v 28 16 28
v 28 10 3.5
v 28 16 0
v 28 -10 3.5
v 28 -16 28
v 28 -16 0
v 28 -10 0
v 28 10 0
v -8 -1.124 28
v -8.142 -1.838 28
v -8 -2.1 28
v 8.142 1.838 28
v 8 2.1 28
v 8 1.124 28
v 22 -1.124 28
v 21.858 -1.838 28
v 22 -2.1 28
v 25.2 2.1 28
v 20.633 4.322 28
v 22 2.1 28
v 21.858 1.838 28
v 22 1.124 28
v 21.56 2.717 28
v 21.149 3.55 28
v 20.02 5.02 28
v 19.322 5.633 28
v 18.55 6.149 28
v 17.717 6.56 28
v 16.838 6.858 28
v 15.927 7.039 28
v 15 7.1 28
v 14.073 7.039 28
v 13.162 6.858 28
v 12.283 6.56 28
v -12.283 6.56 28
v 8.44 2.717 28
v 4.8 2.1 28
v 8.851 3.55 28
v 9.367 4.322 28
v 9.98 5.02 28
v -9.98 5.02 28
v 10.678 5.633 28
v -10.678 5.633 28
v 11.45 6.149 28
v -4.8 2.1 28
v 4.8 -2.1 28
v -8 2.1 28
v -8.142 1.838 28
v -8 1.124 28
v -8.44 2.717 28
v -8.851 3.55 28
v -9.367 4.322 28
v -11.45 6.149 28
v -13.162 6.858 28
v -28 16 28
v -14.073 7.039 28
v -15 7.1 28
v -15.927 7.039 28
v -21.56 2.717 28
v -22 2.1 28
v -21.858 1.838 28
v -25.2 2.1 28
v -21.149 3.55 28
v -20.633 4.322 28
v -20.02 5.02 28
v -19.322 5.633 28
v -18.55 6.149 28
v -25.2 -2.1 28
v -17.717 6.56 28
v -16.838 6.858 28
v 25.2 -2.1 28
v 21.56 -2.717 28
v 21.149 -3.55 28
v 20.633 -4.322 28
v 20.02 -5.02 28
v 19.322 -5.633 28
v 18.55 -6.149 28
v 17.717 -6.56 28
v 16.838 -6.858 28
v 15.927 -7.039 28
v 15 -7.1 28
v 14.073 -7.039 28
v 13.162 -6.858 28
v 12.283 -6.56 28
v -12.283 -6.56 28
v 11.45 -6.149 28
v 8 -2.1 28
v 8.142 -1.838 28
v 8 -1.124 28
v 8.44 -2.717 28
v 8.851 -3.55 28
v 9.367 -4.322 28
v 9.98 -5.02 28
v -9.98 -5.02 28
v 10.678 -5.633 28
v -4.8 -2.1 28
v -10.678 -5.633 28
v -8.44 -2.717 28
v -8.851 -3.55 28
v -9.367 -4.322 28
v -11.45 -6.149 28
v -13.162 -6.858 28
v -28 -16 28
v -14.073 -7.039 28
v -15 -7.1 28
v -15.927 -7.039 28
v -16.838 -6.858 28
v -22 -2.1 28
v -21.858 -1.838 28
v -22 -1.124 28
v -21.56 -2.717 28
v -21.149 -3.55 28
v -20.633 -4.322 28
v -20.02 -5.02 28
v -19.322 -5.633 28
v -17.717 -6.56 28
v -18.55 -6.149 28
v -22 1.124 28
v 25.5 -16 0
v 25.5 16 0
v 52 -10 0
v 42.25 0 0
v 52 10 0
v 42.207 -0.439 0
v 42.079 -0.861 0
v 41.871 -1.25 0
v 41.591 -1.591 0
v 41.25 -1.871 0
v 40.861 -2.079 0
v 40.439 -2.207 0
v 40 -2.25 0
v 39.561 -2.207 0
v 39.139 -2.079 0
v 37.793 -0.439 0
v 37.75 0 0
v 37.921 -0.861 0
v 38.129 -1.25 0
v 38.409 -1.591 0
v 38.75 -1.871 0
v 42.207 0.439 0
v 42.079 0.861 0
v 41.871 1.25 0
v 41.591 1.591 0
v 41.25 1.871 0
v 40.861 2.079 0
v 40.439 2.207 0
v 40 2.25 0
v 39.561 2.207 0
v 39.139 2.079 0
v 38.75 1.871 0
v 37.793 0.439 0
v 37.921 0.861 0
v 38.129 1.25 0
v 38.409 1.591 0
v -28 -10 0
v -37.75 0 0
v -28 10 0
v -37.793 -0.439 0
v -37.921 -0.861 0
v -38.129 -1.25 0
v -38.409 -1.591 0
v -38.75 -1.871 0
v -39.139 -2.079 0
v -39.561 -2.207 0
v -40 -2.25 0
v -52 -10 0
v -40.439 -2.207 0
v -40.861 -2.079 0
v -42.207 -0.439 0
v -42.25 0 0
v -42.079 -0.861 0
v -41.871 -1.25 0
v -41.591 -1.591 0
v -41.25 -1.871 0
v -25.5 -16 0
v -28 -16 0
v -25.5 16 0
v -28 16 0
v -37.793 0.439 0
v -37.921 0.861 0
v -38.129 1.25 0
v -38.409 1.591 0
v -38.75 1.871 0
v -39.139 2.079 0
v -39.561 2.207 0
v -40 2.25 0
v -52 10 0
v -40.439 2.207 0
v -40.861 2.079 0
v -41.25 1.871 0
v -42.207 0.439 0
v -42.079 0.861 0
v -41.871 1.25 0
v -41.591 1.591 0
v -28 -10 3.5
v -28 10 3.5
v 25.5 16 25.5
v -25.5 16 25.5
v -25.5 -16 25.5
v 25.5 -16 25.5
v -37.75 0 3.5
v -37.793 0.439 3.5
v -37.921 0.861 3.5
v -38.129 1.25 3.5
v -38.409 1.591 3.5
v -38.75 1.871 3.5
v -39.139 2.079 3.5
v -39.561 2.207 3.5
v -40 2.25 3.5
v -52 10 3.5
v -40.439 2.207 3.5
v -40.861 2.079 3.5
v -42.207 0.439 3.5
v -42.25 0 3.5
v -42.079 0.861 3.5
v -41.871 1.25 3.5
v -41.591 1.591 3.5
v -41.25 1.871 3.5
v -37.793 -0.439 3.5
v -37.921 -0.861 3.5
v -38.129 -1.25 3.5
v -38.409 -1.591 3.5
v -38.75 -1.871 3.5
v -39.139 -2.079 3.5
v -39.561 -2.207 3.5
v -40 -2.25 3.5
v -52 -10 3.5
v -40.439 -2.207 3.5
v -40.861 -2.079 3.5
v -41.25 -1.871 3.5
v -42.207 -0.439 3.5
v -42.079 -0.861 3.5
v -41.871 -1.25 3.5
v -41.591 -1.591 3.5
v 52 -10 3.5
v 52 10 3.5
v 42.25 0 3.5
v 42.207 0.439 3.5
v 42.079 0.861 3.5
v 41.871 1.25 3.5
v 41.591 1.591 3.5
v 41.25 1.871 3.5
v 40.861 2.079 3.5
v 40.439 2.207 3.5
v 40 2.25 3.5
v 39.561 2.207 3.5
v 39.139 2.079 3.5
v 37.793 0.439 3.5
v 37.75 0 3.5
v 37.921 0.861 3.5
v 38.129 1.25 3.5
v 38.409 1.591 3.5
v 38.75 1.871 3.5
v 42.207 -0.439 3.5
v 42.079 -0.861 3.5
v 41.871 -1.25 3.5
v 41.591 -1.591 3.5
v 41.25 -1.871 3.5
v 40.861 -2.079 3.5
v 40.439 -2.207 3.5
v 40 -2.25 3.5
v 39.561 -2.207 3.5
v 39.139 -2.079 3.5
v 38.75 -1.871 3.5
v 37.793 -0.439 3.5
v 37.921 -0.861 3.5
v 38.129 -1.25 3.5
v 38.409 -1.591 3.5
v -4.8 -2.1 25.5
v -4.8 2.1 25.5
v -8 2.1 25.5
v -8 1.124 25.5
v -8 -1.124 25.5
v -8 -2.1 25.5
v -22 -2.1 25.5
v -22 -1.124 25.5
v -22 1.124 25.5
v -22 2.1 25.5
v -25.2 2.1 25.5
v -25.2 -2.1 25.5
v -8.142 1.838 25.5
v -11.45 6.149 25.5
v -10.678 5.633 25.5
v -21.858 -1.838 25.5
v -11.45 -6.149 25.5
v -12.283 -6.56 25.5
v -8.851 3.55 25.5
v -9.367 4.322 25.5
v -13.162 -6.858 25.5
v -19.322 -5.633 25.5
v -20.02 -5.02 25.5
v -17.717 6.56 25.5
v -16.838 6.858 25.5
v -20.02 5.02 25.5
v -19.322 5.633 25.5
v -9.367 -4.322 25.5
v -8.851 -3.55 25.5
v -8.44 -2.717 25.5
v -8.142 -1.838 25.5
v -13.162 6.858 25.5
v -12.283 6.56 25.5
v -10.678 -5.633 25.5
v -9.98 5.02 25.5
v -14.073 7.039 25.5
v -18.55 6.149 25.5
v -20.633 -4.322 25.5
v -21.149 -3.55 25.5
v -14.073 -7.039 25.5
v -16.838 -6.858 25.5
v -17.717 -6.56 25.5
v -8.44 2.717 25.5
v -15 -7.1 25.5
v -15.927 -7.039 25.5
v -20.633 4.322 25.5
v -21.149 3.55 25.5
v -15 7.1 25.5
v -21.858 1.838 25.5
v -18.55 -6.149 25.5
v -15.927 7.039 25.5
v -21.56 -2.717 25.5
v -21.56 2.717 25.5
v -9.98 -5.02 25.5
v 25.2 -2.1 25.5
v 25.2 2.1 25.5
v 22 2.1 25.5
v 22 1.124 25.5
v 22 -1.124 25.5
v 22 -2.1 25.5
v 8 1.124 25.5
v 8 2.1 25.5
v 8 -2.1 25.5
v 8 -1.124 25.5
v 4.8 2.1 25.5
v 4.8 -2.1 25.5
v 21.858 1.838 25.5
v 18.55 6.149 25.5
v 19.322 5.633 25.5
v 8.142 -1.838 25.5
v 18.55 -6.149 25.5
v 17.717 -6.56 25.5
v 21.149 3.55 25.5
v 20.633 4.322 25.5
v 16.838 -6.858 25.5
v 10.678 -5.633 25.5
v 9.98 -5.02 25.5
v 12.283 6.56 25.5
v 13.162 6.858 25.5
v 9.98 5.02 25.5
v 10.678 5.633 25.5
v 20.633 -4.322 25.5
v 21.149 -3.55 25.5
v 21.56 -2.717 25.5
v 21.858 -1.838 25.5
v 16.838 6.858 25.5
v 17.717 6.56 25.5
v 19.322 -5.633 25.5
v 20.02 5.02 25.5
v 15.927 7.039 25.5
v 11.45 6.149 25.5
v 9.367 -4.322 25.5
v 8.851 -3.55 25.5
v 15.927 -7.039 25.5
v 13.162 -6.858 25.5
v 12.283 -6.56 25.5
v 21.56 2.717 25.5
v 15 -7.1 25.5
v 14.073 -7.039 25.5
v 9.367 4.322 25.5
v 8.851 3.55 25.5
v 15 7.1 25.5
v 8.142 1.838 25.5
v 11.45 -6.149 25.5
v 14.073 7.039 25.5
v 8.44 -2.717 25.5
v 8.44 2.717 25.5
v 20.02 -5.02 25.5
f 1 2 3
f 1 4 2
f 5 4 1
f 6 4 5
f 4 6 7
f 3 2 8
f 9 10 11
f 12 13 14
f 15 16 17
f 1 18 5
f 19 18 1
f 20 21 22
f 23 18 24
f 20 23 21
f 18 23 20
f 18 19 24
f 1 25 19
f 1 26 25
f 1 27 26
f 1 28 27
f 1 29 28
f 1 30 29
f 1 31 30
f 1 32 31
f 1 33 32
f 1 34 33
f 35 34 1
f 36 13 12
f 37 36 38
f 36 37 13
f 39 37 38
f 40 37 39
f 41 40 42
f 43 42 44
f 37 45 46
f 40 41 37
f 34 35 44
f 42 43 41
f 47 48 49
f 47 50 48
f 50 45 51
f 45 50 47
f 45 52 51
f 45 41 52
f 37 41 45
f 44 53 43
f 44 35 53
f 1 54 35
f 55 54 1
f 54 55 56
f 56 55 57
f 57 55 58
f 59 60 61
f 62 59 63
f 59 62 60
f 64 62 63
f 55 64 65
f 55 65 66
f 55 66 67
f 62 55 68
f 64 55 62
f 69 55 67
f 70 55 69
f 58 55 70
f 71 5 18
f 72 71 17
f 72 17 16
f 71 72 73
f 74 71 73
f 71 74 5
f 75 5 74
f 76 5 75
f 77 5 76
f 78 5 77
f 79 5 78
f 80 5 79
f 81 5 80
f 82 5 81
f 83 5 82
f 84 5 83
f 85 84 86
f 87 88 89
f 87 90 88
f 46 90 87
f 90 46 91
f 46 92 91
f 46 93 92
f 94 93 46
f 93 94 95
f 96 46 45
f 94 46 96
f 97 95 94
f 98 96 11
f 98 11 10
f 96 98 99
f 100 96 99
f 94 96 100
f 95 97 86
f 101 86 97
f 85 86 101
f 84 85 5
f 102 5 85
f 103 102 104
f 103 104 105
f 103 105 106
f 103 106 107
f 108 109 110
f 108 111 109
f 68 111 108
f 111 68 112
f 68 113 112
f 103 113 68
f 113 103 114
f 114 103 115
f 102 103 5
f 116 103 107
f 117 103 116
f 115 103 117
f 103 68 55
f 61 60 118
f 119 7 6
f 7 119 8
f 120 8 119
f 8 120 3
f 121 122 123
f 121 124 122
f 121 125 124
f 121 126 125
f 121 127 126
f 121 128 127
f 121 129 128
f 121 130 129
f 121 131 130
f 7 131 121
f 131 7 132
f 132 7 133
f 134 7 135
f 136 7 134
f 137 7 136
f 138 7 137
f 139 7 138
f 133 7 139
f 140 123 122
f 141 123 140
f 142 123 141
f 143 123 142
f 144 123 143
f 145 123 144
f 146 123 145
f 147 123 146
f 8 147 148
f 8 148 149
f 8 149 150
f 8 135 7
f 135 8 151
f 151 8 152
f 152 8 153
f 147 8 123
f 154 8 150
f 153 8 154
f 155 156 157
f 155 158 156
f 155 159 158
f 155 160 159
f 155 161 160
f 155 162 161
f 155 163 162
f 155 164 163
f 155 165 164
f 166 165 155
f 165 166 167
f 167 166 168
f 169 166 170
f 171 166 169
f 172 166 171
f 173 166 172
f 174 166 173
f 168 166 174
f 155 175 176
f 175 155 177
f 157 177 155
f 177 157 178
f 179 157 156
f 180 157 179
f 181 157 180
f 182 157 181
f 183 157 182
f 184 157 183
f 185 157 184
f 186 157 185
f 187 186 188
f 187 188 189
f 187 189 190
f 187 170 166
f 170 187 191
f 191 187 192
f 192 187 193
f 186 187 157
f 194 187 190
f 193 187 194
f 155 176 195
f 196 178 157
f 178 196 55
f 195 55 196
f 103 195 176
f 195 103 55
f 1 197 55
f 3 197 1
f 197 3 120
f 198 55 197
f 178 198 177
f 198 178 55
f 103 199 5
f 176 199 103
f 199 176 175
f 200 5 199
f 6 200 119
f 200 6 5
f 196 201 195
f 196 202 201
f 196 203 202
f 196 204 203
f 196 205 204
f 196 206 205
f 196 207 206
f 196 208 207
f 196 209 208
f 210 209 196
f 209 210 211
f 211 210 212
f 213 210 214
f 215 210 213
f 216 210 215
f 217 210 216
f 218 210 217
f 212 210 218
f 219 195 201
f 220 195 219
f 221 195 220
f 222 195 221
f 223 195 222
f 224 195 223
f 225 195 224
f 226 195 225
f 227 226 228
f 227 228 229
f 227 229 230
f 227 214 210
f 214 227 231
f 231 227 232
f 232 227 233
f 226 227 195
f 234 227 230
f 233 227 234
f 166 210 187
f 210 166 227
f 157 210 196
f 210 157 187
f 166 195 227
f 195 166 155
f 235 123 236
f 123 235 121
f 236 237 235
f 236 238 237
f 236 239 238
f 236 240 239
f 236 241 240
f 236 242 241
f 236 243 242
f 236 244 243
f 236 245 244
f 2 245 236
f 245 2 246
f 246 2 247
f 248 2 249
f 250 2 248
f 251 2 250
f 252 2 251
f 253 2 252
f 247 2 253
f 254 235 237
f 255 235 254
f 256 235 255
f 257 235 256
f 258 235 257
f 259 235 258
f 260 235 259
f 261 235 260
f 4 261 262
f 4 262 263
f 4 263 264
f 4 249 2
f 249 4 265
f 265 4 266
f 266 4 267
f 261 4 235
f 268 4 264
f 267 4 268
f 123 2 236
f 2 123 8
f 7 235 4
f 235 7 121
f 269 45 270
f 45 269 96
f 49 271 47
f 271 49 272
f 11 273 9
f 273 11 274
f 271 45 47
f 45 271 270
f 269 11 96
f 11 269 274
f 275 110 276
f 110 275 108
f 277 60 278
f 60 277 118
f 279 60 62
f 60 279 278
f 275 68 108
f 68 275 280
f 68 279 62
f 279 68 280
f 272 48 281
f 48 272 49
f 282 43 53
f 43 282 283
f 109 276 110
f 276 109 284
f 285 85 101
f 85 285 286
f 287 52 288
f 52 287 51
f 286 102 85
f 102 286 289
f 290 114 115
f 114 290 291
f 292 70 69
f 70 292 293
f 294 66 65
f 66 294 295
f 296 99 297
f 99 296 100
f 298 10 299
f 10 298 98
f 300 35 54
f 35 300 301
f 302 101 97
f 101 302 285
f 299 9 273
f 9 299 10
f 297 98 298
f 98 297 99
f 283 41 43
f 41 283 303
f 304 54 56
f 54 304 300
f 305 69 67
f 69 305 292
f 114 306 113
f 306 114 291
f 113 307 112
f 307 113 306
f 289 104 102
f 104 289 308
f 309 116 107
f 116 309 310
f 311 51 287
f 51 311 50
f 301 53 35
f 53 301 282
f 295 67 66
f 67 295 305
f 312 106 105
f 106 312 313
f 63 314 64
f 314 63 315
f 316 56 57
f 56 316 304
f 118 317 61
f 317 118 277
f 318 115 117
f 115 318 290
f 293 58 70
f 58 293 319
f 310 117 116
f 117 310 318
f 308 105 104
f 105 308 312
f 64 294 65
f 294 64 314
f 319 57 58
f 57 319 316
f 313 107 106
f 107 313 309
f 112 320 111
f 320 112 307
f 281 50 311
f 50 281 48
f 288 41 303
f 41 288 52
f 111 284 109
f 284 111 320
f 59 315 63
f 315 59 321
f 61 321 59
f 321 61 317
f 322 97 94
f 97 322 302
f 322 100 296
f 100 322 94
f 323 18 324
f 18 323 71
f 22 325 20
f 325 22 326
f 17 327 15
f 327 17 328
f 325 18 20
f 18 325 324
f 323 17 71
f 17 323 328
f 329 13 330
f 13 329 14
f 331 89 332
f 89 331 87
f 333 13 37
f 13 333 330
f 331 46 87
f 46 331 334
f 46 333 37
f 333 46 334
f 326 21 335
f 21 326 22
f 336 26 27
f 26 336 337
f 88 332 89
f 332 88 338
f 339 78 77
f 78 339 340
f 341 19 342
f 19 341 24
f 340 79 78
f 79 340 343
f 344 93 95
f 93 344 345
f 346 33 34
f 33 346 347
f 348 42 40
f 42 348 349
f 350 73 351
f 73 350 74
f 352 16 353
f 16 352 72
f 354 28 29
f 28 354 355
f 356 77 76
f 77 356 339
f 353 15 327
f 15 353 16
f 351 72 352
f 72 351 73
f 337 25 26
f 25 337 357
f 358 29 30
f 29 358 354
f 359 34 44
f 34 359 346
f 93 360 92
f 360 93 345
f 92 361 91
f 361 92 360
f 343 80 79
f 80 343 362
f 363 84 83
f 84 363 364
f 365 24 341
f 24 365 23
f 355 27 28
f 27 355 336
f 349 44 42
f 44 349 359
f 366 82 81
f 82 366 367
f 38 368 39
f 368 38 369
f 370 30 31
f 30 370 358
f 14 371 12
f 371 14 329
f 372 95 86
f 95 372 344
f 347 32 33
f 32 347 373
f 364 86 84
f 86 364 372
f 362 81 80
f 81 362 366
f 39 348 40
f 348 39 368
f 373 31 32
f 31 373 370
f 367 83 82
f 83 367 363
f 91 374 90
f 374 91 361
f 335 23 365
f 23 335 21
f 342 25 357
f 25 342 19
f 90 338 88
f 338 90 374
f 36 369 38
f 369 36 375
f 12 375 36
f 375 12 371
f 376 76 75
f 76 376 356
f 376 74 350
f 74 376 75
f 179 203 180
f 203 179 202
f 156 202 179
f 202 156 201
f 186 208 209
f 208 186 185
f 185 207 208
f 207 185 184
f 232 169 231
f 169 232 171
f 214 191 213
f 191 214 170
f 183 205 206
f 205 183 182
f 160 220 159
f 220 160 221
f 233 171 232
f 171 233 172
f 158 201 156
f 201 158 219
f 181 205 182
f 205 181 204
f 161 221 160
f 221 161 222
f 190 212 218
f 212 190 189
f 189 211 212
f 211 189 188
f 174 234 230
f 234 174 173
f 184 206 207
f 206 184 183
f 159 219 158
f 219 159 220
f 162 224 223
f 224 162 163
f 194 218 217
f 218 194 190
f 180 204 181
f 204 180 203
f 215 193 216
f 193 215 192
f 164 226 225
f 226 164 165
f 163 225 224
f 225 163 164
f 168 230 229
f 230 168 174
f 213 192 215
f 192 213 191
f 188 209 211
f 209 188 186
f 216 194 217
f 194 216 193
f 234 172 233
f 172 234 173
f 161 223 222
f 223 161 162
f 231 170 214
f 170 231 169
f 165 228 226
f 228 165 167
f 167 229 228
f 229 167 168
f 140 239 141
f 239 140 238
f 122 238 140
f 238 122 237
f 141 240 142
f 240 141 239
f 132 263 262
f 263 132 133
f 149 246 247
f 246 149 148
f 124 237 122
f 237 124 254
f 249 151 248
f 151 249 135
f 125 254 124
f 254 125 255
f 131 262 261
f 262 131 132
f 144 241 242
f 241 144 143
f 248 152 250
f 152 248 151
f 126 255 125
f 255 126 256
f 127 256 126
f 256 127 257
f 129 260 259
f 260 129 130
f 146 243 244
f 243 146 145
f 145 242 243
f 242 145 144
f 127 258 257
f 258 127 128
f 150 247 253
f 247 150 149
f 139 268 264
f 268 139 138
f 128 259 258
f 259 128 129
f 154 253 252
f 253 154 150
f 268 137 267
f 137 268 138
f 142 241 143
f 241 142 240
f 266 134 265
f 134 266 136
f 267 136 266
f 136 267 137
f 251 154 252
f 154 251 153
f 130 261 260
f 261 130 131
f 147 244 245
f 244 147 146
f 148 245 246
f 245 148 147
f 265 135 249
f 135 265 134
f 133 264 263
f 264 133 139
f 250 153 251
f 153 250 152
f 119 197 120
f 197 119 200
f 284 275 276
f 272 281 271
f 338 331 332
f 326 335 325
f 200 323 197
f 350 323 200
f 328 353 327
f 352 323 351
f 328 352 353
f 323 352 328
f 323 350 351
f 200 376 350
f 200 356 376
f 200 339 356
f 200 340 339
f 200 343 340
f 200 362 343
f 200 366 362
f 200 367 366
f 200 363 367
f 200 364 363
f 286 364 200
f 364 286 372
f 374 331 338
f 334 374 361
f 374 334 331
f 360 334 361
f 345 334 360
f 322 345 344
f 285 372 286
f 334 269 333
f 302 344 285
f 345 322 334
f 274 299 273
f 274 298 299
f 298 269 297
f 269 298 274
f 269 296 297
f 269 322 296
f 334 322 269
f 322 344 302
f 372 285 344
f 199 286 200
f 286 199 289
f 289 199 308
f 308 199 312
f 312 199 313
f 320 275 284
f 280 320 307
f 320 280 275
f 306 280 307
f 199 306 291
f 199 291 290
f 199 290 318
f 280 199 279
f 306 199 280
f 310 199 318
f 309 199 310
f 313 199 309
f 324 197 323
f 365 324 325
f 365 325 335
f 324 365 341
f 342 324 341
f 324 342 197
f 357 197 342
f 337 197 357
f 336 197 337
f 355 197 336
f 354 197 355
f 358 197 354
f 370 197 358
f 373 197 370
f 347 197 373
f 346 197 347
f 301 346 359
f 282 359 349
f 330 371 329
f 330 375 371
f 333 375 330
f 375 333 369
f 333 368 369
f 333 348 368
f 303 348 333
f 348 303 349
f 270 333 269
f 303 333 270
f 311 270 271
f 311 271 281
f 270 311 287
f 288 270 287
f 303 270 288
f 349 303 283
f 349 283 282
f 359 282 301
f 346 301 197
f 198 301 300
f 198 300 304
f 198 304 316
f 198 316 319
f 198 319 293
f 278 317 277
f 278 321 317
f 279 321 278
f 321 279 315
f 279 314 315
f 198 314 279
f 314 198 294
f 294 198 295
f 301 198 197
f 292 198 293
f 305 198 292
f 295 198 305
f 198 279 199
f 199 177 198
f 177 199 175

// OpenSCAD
// T10 Twist-Lock Socket Bracket — Standoff Box, Front Mount
//
// The bracket is a hollow box. The flat mounting tabs press against the panel
// face and are screwed in from the front. The socket face is on the far end of
// the box, entirely in front of the panel. Socket wires live inside the box
// and exit through the open back. No holes needed in the panel.
//
// Print orientation: front face DOWN on the bed (socket holes facing bed).
// No supports required.
//
// Install:
//  1. Screw mounting tabs to panel front — heads accessible from front.
//  2. Insert T10 sockets into the front-face holes, push in, twist ~90° to lock.

// ── Tune these ───────────────────────────────────────────────────────────────
socket_spacing  = 30;    // center-to-center between the two sockets (mm)
socket_hole_dia = 14.2;  // twist-lock hole diameter (opened up for fit)
notch_width     = 4.2;   // tab-insertion notch width
notch_depth     = 3.0;   // notch radial depth past socket hole edge

standoff        = 28;    // panel face → socket face; must clear full socket body
front_thick     = 2.5;   // front face thickness — socket tabs grip the inside face
wall            = 2.5;   // side/top/bottom wall thickness

body_w          = 56;    // box body width  (covers both sockets with margin)
body_h          = 32;    // box body height

tab_extend      = 24;    // how far each mounting tab sticks out past the box body
tab_h           = 20;    // mounting tab height (narrower than body)
tab_thick       = 3.5;   // mounting tab thickness
mount_hole_dia  = 4.5;   // M4 clearance hole
// ─────────────────────────────────────────────────────────────────────────────

socket_r = socket_hole_dia / 2;
half_sp  = socket_spacing / 2;

module socket_cutout() {
    cylinder(h = front_thick + 0.2, r = socket_r, $fn = 48);
    for (a = [0, 180])
        rotate([0, 0, a])
        translate([socket_r - 0.1, -notch_width / 2, -0.1])
        cube([notch_depth + 0.2, notch_width, front_thick + 0.4]);
}

module square_tab(w, h, thick) {
    translate([-w/2, -h/2, 0])
    cube([w, h, thick]);
}

module bracket() {
    difference() {
        union() {
            // Hollow box body (Z=0: open back against panel; Z=standoff: socket face)
            translate([-body_w/2, -body_h/2, 0])
            cube([body_w, body_h, standoff]);

            // Left mounting tab
            translate([-(body_w/2 + tab_extend/2), 0, 0])
            square_tab(tab_extend, tab_h, tab_thick);

            // Right mounting tab
            translate([body_w/2 + tab_extend/2, 0, 0])
            square_tab(tab_extend, tab_h, tab_thick);
        }

        // Hollow — keeps left/right side walls + front face; removes top/bottom walls
        translate([-(body_w/2 - wall), -body_h/2 - 0.1, -0.1])
        cube([body_w - 2*wall, body_h + 0.2, standoff - front_thick + 0.1]);

        // Socket twist-lock holes in the front face
        for (x = [-half_sp, half_sp])
            translate([x, 0, standoff - front_thick - 0.1])
            socket_cutout();

        // M4 mounting holes centered in each tab
        for (x = [-(body_w/2 + tab_extend/2), body_w/2 + tab_extend/2])
            translate([x, 0, -0.1])
            cylinder(h = tab_thick + 0.2, r = mount_hole_dia / 2, $fn = 32);
    }
}

bracket();
